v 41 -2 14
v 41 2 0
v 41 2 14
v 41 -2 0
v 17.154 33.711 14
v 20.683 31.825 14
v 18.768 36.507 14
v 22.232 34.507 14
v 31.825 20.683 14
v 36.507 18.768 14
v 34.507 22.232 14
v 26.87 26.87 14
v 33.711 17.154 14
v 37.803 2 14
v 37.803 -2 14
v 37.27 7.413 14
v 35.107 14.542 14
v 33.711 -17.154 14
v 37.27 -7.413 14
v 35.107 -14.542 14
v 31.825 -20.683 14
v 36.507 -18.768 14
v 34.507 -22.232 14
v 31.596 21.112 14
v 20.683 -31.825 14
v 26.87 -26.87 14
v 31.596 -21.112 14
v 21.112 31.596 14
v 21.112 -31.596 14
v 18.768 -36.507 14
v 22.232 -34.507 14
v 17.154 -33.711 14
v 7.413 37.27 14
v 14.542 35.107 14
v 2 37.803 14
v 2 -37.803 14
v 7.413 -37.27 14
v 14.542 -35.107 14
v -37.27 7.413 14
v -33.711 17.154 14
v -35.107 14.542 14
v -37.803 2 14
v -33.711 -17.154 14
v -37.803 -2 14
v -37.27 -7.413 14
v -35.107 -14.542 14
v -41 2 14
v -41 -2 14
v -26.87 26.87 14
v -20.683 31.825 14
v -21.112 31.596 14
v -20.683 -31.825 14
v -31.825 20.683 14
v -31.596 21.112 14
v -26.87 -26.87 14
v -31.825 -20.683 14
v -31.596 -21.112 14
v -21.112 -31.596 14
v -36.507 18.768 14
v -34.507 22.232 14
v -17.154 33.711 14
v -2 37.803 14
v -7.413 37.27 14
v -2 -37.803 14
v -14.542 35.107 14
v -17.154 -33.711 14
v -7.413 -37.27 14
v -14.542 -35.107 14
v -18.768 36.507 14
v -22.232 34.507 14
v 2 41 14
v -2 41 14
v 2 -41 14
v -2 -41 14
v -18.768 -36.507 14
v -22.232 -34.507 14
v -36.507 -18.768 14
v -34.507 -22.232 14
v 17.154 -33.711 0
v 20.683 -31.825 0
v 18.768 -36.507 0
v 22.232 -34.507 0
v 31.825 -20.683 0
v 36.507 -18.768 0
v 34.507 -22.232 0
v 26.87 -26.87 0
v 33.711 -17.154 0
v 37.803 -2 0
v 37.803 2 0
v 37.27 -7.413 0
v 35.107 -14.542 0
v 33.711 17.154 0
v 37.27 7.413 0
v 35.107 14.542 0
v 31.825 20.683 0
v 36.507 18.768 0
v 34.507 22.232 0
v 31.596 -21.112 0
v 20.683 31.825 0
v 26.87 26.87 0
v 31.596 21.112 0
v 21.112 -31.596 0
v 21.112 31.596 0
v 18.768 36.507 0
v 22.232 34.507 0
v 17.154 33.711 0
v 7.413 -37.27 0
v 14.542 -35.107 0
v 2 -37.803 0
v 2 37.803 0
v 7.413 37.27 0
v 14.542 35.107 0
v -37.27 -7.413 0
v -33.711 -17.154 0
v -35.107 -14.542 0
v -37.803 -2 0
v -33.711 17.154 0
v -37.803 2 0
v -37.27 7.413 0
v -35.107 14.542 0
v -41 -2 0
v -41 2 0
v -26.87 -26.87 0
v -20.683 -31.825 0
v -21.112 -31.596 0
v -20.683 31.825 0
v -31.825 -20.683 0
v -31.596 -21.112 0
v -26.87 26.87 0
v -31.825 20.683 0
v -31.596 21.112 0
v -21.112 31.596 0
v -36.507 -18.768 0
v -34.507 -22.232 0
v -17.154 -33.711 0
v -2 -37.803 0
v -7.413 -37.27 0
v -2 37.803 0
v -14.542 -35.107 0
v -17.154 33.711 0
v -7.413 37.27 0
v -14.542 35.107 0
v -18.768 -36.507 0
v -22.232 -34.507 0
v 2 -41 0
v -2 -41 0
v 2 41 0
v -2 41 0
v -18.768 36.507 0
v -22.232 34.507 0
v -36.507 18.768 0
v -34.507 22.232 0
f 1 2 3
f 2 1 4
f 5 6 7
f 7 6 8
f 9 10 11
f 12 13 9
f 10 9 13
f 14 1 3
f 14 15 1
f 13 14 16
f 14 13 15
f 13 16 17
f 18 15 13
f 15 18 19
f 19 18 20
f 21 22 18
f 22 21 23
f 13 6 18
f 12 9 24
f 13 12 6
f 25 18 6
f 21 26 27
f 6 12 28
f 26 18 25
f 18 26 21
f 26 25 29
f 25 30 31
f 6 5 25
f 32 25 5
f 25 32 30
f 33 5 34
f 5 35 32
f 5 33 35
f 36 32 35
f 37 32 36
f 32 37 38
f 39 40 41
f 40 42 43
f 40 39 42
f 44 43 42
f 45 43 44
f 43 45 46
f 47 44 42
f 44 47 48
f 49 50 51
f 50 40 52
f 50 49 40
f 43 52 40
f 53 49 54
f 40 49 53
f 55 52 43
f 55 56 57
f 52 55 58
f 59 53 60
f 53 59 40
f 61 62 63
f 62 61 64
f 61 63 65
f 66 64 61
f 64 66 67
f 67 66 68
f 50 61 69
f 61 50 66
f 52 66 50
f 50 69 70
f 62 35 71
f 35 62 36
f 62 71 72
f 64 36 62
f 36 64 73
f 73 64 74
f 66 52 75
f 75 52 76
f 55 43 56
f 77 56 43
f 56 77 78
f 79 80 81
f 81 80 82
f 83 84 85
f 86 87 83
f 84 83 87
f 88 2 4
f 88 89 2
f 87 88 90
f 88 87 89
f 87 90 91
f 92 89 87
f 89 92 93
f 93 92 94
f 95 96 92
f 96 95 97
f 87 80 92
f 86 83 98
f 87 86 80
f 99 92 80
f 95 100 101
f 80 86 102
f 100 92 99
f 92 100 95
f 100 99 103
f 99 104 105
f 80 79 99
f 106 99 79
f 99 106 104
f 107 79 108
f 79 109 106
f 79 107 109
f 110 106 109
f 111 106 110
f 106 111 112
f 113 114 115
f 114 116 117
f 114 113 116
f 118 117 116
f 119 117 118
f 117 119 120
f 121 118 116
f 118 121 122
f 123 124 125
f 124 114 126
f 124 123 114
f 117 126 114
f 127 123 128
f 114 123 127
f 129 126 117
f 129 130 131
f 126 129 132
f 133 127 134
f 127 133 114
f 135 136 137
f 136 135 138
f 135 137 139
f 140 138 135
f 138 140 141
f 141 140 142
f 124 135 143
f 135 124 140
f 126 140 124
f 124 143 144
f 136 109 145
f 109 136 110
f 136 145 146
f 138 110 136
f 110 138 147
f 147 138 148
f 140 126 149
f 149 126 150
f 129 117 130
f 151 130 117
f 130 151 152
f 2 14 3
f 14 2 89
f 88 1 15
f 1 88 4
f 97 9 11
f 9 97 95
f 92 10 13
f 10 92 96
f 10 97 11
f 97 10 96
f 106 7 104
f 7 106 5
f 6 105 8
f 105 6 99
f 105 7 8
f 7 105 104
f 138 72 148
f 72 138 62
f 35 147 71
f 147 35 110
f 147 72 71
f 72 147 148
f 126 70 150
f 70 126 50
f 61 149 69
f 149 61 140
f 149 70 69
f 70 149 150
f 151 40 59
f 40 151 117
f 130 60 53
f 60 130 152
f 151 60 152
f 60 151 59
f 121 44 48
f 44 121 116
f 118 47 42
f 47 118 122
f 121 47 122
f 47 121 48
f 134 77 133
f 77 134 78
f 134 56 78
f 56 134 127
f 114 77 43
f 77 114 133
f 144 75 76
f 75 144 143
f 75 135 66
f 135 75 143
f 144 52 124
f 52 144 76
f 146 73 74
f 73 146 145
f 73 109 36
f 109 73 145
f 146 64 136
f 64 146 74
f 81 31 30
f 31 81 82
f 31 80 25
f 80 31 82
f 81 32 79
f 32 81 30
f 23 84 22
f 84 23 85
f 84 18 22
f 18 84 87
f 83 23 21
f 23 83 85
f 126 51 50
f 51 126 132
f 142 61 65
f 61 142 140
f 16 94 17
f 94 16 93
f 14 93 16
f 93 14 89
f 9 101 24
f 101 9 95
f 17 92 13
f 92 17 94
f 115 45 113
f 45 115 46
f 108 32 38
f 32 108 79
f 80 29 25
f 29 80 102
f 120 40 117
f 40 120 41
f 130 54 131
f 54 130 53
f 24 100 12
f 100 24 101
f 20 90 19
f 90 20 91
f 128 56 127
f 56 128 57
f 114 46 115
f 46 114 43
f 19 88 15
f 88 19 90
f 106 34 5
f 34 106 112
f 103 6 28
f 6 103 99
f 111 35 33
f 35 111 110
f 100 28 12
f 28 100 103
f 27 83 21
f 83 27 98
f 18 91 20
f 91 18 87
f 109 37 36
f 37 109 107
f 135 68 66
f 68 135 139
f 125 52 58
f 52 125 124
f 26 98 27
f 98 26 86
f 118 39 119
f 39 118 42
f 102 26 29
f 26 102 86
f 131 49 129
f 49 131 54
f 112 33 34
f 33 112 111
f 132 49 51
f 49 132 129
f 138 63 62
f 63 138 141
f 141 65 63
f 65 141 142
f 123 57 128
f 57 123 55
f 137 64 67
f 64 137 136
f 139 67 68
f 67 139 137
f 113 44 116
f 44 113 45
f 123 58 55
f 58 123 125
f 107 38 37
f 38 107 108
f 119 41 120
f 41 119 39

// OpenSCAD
$fn = 32;

// ----------------------------------------------------------------------
// Spur blank: plain gear blank
// ----------------------------------------------------------------------

// --- parameters (mm) ---
disc_r = 38;              // blank root radius
disc_t = 14;              // blank thickness
n_teeth = 12;             // stub tooth count
tooth_w = 4;              // tooth width at the root
tooth_h = 3;              // tooth height above the root

out_r = disc_r + tooth_h;  // tip radius
bbox_x = 82.0;  // measured width over the teeth
bbox_y = 82.0;  // measured depth over the teeth

union() {
  cylinder(r = disc_r, h = disc_t);
  for (i = [0 : n_teeth - 1])
    rotate([0, 0, i * 360 / n_teeth])
      translate([disc_r - 1, -tooth_w / 2, 0])
        cube([tooth_h + 1, tooth_w, disc_t]);
}
